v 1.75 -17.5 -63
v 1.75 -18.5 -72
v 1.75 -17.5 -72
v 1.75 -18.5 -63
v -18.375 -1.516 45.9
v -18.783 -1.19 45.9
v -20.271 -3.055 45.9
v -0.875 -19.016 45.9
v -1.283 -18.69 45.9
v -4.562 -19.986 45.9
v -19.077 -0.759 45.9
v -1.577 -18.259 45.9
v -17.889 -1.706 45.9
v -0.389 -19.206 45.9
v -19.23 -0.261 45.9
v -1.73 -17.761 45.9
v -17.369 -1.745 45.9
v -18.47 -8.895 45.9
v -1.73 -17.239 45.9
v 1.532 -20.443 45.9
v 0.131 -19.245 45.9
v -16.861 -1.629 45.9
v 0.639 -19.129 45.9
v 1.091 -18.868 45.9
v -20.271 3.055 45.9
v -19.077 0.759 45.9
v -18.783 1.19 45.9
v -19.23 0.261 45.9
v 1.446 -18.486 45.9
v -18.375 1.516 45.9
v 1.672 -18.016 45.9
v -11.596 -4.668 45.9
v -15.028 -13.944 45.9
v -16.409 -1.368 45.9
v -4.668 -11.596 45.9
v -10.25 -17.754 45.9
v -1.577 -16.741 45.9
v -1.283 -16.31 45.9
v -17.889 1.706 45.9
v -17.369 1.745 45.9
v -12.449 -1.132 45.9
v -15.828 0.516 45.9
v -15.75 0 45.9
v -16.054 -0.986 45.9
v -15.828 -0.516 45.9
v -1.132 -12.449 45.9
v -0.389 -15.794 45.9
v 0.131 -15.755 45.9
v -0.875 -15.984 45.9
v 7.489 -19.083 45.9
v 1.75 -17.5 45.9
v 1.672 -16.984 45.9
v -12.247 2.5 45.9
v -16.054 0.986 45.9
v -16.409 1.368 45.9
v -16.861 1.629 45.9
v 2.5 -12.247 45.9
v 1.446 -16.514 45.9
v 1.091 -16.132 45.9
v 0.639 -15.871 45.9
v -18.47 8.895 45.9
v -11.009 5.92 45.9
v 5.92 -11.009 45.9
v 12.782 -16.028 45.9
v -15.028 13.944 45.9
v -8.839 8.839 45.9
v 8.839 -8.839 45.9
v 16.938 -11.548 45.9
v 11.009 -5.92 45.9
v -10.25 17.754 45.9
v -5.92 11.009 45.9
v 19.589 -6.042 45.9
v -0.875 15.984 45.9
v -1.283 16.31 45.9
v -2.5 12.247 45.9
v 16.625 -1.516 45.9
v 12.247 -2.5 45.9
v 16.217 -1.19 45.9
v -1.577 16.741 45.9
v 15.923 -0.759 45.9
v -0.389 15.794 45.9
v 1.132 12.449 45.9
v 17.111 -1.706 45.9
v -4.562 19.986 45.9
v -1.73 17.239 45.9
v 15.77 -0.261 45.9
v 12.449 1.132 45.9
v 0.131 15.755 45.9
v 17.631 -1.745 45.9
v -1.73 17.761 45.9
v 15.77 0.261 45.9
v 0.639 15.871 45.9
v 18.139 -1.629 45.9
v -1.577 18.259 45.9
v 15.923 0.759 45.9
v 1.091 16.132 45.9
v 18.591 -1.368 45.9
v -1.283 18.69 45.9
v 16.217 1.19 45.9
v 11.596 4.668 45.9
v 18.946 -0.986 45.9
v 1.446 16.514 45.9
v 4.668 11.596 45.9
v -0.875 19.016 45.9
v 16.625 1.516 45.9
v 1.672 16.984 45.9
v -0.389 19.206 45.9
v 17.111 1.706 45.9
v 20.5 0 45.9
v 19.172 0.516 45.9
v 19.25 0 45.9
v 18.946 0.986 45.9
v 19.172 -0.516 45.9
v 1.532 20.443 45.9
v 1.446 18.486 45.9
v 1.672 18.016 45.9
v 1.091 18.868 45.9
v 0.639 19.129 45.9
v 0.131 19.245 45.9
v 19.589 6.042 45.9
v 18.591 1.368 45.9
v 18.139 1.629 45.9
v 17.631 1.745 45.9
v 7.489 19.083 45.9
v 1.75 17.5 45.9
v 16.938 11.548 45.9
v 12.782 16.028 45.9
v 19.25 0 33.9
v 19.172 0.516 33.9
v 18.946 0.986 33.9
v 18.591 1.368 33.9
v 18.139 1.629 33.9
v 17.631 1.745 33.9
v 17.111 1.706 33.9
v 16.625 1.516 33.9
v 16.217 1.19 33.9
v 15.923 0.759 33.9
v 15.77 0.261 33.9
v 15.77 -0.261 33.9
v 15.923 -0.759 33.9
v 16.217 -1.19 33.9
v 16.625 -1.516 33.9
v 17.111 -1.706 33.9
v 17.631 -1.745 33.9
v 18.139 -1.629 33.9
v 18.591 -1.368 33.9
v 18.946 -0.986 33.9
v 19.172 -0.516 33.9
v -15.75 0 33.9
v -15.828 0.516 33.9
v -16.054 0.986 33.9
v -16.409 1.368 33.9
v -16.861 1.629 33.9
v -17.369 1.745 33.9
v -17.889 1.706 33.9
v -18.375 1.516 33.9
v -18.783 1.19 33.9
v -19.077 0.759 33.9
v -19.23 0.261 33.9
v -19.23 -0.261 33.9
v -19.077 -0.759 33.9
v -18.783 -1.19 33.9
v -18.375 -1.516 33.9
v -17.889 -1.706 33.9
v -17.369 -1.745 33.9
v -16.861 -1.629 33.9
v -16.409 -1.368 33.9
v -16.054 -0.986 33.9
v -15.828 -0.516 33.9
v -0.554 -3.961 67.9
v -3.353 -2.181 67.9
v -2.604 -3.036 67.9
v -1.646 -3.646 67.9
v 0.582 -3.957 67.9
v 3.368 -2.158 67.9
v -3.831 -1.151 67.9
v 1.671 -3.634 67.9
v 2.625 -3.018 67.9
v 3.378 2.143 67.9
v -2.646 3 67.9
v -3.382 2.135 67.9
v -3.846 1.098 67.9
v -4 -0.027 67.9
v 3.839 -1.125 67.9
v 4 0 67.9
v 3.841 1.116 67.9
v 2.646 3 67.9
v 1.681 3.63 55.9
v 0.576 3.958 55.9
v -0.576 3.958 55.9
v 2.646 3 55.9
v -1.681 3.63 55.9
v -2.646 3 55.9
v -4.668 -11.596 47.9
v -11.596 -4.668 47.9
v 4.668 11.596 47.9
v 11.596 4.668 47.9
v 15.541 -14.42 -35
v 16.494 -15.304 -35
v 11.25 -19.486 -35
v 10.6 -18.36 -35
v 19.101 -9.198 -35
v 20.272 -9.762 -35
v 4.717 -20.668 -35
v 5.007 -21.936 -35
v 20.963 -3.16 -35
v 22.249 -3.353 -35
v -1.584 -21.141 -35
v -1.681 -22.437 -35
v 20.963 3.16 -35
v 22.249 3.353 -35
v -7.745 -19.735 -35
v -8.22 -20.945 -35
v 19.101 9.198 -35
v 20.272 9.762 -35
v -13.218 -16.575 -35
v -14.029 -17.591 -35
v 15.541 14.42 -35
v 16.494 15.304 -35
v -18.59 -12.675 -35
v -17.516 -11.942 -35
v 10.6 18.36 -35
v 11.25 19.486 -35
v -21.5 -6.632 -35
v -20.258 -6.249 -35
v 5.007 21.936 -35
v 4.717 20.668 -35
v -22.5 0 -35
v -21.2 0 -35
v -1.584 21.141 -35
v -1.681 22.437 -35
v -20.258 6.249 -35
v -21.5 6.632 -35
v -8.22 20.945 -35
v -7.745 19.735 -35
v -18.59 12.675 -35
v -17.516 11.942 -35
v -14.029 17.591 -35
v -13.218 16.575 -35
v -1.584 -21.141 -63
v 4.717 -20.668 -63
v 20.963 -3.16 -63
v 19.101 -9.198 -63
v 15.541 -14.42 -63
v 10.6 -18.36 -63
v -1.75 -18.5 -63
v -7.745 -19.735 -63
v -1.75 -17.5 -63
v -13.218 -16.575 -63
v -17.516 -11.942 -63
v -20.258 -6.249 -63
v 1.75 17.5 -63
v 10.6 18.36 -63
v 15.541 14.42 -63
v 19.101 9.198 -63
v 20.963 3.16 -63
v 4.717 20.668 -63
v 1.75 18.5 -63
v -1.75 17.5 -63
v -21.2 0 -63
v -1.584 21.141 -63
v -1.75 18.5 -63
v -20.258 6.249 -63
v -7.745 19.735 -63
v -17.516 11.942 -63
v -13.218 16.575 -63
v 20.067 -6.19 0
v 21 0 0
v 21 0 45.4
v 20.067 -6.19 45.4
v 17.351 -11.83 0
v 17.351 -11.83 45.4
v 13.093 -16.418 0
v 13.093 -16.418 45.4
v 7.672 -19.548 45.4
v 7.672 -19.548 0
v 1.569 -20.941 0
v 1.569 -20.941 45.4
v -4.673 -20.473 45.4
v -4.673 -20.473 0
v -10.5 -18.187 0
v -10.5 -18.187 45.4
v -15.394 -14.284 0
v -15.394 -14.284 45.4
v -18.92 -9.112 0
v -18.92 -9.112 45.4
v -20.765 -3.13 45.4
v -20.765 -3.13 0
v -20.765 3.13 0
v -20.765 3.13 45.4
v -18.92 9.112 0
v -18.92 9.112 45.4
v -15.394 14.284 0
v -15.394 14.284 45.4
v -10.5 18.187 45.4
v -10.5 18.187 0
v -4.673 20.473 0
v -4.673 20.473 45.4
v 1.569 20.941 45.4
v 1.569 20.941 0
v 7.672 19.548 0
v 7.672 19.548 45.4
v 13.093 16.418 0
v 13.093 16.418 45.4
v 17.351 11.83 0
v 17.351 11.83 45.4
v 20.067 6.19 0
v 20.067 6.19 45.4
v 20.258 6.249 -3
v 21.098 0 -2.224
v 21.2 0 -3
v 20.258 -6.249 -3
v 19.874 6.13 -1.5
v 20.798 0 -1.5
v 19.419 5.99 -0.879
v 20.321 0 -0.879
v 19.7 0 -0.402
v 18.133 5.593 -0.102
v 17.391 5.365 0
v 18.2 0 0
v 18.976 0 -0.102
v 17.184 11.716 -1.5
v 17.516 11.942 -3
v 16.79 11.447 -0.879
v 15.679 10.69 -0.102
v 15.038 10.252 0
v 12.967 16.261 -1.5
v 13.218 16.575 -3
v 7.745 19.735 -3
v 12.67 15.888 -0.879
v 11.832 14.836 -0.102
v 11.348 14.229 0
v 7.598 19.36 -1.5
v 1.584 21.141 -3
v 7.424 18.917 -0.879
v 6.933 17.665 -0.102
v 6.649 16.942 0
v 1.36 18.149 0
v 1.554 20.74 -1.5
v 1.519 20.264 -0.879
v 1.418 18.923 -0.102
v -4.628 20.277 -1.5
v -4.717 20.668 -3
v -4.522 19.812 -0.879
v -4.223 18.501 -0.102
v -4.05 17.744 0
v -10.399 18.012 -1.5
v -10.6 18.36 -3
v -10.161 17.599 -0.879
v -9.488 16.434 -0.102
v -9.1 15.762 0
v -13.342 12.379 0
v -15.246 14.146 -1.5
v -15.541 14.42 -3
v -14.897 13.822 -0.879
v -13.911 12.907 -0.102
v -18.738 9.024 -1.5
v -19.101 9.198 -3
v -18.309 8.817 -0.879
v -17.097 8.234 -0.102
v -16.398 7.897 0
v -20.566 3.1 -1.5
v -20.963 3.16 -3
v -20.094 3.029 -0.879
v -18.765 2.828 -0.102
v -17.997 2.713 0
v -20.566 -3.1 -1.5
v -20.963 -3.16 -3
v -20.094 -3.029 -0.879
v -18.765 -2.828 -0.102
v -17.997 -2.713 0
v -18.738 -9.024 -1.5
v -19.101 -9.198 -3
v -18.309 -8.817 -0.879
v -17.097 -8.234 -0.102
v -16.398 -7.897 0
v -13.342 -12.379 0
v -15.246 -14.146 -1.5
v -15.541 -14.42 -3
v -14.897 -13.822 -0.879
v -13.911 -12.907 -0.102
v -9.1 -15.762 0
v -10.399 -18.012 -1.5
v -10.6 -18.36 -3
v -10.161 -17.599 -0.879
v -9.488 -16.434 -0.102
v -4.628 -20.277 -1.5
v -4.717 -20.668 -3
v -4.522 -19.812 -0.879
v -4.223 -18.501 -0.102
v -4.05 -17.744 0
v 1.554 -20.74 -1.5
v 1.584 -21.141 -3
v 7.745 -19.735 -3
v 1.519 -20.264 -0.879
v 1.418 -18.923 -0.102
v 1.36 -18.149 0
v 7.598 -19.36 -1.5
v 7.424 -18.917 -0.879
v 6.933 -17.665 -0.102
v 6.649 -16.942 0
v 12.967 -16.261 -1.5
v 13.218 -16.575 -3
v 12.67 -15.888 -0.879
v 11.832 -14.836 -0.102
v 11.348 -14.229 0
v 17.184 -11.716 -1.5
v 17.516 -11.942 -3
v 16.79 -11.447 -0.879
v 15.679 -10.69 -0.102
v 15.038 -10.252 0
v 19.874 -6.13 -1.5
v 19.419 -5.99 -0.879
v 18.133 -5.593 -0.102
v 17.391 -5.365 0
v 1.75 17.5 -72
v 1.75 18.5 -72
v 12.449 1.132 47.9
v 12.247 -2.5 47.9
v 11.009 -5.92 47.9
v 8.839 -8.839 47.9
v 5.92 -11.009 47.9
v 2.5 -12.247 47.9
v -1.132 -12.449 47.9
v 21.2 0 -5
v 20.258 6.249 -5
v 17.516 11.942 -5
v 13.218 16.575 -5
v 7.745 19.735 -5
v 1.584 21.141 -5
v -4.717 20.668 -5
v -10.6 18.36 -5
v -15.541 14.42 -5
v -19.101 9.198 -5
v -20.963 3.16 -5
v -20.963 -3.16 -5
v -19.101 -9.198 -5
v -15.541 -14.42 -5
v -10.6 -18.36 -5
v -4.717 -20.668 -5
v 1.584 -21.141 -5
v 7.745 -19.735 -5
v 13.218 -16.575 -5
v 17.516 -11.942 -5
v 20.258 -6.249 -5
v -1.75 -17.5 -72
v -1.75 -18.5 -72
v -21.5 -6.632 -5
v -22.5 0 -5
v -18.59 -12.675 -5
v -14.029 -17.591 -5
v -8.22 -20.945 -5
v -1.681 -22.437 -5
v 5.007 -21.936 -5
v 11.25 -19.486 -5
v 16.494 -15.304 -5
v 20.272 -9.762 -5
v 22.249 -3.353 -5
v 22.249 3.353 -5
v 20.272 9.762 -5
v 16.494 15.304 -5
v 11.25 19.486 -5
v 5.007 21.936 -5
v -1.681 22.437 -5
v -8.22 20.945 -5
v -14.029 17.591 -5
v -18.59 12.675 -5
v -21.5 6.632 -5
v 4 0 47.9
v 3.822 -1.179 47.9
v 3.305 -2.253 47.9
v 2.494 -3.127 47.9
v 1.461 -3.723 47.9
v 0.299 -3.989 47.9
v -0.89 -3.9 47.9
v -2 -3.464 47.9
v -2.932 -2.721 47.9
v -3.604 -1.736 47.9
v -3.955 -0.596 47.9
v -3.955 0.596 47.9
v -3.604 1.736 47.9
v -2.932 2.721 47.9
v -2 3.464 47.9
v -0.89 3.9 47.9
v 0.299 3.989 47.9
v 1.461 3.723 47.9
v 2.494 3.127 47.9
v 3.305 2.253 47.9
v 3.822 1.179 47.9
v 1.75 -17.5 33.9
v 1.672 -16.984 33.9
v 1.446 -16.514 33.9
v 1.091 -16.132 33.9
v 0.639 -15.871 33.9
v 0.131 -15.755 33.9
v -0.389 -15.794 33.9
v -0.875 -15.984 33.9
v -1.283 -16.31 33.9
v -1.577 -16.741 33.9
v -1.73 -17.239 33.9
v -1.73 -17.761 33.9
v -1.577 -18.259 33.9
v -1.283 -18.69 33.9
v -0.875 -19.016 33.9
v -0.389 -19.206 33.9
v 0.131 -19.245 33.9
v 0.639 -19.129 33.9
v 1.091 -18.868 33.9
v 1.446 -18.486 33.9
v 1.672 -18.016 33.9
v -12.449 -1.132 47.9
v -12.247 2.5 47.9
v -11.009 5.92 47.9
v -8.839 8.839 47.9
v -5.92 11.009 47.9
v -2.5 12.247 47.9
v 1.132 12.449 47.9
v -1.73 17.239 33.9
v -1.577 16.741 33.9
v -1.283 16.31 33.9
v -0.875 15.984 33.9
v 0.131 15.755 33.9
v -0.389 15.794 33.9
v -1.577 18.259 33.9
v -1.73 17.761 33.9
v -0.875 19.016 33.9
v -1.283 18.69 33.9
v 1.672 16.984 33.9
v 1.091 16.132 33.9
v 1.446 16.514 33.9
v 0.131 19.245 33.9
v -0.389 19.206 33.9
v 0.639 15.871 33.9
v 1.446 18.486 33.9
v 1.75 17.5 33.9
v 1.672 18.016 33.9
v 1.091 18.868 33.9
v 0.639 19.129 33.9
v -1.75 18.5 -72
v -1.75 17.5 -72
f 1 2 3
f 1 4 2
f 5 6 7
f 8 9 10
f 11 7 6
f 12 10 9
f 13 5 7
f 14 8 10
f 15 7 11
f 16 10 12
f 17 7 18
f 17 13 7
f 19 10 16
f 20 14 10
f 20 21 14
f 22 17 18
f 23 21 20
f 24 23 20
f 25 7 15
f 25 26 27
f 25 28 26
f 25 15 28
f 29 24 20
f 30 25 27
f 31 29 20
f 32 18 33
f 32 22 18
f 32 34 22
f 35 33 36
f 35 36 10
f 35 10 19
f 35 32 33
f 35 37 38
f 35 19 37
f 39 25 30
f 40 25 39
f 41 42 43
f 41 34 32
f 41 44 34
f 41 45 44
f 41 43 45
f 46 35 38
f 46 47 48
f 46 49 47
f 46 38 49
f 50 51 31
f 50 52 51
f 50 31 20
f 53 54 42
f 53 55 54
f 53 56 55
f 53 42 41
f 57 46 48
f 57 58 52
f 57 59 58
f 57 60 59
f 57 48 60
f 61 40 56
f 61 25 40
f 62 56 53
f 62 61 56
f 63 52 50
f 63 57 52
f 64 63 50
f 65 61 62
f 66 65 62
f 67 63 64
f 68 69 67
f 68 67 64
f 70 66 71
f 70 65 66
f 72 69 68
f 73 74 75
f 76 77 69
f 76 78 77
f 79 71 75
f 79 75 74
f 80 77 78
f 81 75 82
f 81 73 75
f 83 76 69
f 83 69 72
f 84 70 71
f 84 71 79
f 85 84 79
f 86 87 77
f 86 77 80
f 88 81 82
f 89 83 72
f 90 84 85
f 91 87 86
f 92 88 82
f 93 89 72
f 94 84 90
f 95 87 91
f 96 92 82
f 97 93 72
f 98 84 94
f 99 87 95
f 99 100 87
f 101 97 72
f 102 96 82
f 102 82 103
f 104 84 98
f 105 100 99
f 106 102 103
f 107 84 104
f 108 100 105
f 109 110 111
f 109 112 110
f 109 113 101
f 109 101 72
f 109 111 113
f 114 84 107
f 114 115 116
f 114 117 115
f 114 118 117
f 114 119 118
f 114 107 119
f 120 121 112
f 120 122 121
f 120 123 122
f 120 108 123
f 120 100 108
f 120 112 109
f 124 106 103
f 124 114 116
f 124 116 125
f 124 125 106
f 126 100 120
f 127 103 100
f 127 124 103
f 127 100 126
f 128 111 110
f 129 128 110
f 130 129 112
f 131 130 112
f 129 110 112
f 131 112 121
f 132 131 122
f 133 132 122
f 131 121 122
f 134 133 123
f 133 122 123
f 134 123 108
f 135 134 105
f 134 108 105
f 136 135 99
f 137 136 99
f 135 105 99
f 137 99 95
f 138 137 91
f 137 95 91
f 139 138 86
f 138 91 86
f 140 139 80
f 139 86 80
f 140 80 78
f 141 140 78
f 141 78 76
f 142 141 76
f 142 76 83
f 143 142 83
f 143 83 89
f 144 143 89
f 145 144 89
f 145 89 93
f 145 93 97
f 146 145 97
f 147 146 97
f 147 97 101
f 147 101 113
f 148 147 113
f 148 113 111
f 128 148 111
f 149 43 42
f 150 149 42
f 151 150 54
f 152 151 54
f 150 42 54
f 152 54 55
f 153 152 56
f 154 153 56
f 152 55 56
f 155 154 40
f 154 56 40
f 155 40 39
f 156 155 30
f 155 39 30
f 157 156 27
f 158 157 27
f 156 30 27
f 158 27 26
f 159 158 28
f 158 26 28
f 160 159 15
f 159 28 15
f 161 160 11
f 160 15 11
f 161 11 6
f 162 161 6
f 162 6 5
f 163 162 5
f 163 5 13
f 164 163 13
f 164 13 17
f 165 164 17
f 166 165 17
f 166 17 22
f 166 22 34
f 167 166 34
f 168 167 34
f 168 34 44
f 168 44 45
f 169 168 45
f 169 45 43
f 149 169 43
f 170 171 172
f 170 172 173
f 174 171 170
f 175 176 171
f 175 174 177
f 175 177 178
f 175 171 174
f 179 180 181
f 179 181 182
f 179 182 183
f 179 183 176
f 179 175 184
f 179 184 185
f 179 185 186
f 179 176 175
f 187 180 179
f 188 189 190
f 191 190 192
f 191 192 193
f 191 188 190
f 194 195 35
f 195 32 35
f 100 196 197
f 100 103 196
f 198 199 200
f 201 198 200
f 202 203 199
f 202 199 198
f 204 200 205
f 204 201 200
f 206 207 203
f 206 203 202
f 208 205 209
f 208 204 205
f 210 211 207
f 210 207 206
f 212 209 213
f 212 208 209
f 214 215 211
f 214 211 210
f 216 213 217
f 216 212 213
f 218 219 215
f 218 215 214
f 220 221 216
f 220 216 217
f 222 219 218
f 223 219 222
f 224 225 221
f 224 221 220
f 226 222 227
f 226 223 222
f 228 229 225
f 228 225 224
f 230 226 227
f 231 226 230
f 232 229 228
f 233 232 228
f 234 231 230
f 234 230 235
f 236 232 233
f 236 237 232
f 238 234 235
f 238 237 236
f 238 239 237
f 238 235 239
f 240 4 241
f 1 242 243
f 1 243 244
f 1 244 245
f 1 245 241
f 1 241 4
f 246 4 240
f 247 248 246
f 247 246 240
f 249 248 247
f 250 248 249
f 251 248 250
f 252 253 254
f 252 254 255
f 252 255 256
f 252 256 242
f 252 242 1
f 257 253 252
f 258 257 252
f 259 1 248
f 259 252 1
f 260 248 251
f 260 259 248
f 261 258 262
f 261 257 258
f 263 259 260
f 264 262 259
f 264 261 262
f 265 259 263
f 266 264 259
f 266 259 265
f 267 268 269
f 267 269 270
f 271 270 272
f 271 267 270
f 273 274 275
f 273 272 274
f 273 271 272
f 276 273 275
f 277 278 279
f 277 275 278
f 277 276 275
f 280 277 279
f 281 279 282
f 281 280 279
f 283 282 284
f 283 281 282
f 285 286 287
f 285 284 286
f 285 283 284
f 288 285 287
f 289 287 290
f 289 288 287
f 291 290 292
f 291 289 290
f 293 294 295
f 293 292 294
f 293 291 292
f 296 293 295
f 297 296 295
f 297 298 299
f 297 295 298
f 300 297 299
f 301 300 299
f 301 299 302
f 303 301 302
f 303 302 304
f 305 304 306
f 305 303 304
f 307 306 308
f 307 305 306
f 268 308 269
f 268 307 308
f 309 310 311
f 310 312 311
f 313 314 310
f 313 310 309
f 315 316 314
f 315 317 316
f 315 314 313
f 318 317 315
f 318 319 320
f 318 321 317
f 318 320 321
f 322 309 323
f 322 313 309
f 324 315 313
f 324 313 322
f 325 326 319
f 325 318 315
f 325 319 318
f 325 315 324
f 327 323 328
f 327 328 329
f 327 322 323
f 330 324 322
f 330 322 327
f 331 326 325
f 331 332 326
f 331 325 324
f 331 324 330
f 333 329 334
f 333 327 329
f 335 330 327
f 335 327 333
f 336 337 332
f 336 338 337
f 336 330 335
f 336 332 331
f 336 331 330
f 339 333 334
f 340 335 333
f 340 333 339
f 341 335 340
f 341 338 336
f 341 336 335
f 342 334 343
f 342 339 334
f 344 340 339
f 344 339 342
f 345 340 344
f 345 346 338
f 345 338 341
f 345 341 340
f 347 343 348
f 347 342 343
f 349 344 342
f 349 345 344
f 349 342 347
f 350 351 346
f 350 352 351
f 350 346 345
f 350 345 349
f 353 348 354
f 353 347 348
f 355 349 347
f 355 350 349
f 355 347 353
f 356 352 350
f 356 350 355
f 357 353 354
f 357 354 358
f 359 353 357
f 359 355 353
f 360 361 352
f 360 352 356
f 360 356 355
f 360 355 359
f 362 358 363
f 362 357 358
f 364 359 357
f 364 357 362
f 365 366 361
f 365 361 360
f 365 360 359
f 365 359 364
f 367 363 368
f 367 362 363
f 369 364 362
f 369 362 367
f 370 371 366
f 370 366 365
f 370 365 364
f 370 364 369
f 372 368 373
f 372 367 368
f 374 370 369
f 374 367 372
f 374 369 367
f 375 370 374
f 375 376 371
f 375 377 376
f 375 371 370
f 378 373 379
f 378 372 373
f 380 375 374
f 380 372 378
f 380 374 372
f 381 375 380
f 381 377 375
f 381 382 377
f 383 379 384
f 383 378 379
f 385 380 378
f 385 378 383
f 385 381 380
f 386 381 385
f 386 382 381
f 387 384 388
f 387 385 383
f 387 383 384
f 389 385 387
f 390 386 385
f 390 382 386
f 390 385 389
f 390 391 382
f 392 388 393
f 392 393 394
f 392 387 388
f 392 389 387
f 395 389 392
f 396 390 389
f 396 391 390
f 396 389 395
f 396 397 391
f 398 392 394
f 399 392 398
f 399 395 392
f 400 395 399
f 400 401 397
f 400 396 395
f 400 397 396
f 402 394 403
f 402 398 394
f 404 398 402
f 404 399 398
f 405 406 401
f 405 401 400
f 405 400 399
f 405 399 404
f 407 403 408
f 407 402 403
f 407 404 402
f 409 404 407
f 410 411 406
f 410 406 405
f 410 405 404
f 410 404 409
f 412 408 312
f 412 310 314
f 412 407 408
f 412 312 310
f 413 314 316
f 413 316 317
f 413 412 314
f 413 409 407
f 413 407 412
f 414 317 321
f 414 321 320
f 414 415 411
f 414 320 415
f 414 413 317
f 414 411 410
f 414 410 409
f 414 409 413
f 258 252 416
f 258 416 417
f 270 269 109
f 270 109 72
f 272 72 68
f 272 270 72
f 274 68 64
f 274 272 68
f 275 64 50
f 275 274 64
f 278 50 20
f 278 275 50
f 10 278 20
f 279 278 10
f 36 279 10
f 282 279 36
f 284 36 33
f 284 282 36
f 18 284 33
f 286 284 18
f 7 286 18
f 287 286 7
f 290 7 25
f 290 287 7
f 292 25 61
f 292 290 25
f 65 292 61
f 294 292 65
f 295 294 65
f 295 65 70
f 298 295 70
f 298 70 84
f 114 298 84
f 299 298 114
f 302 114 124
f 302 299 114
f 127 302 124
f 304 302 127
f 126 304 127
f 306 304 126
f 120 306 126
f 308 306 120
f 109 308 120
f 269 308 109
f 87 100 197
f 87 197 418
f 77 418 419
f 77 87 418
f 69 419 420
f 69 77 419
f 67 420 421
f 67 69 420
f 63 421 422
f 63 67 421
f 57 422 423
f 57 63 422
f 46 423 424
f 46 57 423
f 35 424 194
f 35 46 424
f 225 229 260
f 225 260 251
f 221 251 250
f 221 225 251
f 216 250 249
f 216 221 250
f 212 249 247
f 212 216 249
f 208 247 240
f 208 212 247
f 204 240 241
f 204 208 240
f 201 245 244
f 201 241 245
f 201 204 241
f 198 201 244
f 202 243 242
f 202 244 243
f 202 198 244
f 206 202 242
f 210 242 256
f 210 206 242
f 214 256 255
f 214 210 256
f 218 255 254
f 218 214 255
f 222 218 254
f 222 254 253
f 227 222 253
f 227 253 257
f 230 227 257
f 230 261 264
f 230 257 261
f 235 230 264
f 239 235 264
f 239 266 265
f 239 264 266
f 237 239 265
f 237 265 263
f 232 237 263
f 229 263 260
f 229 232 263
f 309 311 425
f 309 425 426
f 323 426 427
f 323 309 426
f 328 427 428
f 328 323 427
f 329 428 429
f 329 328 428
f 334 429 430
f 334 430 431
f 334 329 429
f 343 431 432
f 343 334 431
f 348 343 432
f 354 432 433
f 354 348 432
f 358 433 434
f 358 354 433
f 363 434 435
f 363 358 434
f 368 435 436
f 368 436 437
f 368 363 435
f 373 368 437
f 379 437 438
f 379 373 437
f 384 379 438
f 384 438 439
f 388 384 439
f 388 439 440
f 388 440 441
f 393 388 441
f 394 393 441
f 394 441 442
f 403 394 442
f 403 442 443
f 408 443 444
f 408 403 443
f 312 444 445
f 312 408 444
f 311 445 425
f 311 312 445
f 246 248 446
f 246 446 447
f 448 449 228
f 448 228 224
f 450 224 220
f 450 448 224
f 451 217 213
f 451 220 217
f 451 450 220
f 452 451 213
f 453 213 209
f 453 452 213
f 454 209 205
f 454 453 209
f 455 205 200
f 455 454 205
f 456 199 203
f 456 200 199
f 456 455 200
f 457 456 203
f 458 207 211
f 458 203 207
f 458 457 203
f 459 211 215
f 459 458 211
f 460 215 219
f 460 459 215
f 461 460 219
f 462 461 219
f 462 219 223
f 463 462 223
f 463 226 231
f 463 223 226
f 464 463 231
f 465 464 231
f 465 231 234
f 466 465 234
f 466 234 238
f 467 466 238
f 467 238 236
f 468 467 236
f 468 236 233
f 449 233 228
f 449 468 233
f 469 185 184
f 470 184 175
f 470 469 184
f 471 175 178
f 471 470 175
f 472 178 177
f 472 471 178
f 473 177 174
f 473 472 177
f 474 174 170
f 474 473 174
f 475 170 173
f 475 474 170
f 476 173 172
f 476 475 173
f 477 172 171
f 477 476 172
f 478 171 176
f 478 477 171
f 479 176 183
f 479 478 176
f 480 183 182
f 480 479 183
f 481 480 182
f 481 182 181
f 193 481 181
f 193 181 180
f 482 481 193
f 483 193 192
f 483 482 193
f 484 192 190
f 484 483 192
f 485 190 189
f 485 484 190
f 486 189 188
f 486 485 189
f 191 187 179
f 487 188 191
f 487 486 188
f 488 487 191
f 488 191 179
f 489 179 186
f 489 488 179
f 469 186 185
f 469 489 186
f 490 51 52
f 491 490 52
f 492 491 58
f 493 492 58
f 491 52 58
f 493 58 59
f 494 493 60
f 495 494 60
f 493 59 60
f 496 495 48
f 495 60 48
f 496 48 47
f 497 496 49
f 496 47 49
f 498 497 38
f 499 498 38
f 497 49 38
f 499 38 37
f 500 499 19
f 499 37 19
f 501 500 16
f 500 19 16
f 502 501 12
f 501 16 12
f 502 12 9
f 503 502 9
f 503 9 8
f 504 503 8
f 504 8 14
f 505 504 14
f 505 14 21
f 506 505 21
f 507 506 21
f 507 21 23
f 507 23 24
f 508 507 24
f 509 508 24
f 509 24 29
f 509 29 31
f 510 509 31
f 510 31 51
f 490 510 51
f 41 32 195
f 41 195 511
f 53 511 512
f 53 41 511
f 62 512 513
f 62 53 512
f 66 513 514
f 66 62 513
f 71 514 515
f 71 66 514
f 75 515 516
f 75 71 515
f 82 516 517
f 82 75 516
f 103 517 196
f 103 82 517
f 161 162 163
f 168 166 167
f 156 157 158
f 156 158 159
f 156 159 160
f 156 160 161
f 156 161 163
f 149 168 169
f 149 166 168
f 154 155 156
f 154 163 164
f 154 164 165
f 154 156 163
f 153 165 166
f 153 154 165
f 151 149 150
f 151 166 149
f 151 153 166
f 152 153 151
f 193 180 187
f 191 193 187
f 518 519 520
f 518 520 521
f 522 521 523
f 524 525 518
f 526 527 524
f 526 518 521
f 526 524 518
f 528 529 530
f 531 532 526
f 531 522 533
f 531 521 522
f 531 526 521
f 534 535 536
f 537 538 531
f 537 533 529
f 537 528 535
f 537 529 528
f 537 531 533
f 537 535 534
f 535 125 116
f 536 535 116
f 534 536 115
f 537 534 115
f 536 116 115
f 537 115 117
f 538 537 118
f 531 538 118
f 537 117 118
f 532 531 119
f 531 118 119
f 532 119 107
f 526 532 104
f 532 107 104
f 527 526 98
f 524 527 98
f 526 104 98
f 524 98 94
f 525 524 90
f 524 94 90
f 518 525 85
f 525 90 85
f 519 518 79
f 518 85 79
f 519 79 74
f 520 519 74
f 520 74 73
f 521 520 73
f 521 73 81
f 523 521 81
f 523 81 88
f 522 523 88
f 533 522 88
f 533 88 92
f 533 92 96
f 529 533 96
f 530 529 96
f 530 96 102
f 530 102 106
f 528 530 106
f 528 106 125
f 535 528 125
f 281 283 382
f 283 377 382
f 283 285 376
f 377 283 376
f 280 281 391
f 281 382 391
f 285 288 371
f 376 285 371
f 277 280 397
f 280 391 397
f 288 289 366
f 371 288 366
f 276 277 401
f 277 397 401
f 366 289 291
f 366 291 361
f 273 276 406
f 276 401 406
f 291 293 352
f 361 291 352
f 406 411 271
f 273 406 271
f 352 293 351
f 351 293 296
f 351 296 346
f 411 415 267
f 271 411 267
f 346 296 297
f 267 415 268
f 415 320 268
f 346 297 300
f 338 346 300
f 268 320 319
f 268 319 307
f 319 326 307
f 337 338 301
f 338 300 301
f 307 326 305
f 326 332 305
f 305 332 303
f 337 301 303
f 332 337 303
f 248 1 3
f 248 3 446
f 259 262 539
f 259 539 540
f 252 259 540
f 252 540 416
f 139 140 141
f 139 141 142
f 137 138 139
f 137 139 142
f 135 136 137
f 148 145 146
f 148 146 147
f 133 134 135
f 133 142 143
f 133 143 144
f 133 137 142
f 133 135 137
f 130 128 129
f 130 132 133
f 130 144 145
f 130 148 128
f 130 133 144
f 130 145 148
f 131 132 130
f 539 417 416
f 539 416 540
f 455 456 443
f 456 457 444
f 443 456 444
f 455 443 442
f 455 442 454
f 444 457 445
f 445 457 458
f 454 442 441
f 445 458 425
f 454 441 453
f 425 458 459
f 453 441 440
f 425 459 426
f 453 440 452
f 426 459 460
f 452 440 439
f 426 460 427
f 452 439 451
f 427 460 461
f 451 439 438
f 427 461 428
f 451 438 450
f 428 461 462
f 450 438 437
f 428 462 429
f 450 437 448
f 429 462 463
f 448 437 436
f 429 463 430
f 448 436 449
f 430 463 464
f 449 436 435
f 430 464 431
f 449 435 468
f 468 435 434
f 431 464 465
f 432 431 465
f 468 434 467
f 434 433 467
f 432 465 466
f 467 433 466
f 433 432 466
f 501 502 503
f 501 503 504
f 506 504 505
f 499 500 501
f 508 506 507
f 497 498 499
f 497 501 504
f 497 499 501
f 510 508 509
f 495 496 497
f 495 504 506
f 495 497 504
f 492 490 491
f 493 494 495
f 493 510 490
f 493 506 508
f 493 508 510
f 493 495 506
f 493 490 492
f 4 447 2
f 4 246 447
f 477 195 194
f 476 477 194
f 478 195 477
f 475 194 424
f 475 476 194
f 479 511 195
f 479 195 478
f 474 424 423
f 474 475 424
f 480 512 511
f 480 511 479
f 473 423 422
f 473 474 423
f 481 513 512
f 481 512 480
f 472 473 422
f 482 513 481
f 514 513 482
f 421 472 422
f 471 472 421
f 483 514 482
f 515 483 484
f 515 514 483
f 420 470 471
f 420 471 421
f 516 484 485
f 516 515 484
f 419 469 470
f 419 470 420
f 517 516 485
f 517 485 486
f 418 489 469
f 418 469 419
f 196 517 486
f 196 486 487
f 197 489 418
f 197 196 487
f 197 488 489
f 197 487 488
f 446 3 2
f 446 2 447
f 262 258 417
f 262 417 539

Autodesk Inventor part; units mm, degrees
ref_plane "YZ Plane" through (0, 0, 0) normal (1, 0, 0) x (0, 1, 0)
ref_plane "XZ Plane" through (0, 0, 0) normal (0, 1, 0) x (-1, 0, 0)
ref_plane "XY Plane" through (0, 0, 0) normal (0, 0, 1) x (1, 0, 0)
sketch "スケッチ1" plane through (0, 0, 0) normal (0, 0, 1) x (1, 0, 0)
  circle A0 centre (0, 0) radius 21.2
  dimension "d0" = 42.4
extrude "押し出し1" add sketch "スケッチ1" against normal blind 5
sketch "スケッチ2" plane through (0, 0, -5) normal (0, 0, -1) x (-1, 0, 0)
  circle A0 centre (0, 0) radius 22.5
  dimension "d3" = 45
extrude "押し出し2" add sketch "スケッチ2" along normal blind 30
sketch "スケッチ3" plane through (0, 0, -35) normal (0, 0, -1) x (-1, 0, 0)
  circle A0 centre (0, 0) radius 21.2
  dimension "d6" = 42.4
extrude "押し出し3" add sketch "スケッチ3" along normal blind 28
fillet "フィレット1" radius 3 1 edges at (-21.2, 0, 0)
sketch "スケッチ4" plane through (0, 0, -63) normal (0, 0, -1) x (-1, 0, 0)
  line L0 (-1.75, 18.5) -> (1.75, 18.5)
  line L1 (1.75, 18.5) -> (1.75, 17.5)
  line L2 (1.75, 17.5) -> (-1.75, 17.5)
  line L3 (-1.75, 17.5) -> (-1.75, 18.5)
  line L4 (-1.75, -17.5) -> (1.75, -17.5)
  line L5 (1.75, -17.5) -> (1.75, -18.5)
  line L6 (1.75, -18.5) -> (-1.75, -18.5)
  line L7 (-1.75, -18.5) -> (-1.75, -17.5)
  point P0 (0, 0)
  dimension "d10" = 3.5
  dimension "d11" = 1
  dimension "d12" = 3.5
  dimension "d13" = 1
  dimension "d14" = 17.5
  dimension "d15" = 17.5
  dimension "d16" = 1.75
extrude "押し出し4" add sketch "スケッチ4" along normal blind 9
sketch "スケッチ5" plane through (0, 0, 0) normal (0, 0, 1) x (1, 0, 0)
  circle A0 centre (0, 0) radius 21
  dimension "d19" = 42
extrude "押し出し5" add sketch "スケッチ5" along normal blind 45.9
chamfer "面取り1" distance 0.5 angle 45 1 edges at (-21, 0, 45.9)
sketch "スケッチ6" plane through (0, 0, 45.9) normal (0, 0, 1) x (1, 0, 0)
  arc A0 (4.6676, 11.5958) -> (-11.5958, -4.6676) centre (0, 0) ccw
  line L0 (4.6676, 11.5958) -> (11.5958, 4.6676)
  line L1 (-11.5958, -4.6676) -> (-4.6676, -11.5958)
  line L2 (11.5958, 4.6676) -> (9.2337, 4.6676) construction
  arc A1 (11.5958, 4.6676) -> (4.6676, 11.5958) centre (0, 0) ccw construction
  arc A2 (-11.5958, -4.6676) -> (-4.6676, -11.5958) centre (0, 0) ccw construction
  arc A3 (-4.6676, -11.5958) -> (11.5958, 4.6676) centre (0, 0) ccw
  dimension "d25" = 25
  dimension "d26" = 11.5
  dimension "d27" = 23
  dimension "d28" = 45
extrude "押し出し6" add sketch "スケッチ6" along normal blind 2
sketch "スケッチ7" plane through (0, 0, 47.9) normal (0, 0, 1) x (1, 0, 0)
  circle A0 centre (0, 0) radius 4
  dimension "d31" = 8
extrude "押し出し7" add sketch "スケッチ7" along normal blind 20
sketch "スケッチ8" plane through (0, 0, 67.9) normal (0, 0, 1) x (1, 0, 0)
  circle A0 centre (0, 0) radius 4 projected
  arc A1 (-2.6458, 3) -> (2.6458, 3) centre (0, 0) ccw
  line L0 (-2.6458, 3) -> (2.6458, 3)
  point P0 (2.6458, 3)
  dimension "d34" = 3
extrude "押し出し8" cut sketch "スケッチ8" against normal blind 12 contours L0 A0 picked at (-0.6179, 3.1815)
sketch "スケッチ9" plane through (0, 0, 45.9) normal (0, 0, 1) x (1, 0, 0)
  circle A0 centre (0, 17.5) radius 1.75
  circle A1 centre (-17.5, 0) radius 1.75
  circle A2 centre (0, -17.5) radius 1.75
  circle A3 centre (17.5, 0) radius 1.75
  point P0 (0, 0)
  dimension "d37" = 3.5
  dimension "d38" = 17.5
  dimension "d41" = 360
extrude "押し出し9" cut sketch "スケッチ9" against normal blind 12
properties part number "RS-775GM104 v1"
